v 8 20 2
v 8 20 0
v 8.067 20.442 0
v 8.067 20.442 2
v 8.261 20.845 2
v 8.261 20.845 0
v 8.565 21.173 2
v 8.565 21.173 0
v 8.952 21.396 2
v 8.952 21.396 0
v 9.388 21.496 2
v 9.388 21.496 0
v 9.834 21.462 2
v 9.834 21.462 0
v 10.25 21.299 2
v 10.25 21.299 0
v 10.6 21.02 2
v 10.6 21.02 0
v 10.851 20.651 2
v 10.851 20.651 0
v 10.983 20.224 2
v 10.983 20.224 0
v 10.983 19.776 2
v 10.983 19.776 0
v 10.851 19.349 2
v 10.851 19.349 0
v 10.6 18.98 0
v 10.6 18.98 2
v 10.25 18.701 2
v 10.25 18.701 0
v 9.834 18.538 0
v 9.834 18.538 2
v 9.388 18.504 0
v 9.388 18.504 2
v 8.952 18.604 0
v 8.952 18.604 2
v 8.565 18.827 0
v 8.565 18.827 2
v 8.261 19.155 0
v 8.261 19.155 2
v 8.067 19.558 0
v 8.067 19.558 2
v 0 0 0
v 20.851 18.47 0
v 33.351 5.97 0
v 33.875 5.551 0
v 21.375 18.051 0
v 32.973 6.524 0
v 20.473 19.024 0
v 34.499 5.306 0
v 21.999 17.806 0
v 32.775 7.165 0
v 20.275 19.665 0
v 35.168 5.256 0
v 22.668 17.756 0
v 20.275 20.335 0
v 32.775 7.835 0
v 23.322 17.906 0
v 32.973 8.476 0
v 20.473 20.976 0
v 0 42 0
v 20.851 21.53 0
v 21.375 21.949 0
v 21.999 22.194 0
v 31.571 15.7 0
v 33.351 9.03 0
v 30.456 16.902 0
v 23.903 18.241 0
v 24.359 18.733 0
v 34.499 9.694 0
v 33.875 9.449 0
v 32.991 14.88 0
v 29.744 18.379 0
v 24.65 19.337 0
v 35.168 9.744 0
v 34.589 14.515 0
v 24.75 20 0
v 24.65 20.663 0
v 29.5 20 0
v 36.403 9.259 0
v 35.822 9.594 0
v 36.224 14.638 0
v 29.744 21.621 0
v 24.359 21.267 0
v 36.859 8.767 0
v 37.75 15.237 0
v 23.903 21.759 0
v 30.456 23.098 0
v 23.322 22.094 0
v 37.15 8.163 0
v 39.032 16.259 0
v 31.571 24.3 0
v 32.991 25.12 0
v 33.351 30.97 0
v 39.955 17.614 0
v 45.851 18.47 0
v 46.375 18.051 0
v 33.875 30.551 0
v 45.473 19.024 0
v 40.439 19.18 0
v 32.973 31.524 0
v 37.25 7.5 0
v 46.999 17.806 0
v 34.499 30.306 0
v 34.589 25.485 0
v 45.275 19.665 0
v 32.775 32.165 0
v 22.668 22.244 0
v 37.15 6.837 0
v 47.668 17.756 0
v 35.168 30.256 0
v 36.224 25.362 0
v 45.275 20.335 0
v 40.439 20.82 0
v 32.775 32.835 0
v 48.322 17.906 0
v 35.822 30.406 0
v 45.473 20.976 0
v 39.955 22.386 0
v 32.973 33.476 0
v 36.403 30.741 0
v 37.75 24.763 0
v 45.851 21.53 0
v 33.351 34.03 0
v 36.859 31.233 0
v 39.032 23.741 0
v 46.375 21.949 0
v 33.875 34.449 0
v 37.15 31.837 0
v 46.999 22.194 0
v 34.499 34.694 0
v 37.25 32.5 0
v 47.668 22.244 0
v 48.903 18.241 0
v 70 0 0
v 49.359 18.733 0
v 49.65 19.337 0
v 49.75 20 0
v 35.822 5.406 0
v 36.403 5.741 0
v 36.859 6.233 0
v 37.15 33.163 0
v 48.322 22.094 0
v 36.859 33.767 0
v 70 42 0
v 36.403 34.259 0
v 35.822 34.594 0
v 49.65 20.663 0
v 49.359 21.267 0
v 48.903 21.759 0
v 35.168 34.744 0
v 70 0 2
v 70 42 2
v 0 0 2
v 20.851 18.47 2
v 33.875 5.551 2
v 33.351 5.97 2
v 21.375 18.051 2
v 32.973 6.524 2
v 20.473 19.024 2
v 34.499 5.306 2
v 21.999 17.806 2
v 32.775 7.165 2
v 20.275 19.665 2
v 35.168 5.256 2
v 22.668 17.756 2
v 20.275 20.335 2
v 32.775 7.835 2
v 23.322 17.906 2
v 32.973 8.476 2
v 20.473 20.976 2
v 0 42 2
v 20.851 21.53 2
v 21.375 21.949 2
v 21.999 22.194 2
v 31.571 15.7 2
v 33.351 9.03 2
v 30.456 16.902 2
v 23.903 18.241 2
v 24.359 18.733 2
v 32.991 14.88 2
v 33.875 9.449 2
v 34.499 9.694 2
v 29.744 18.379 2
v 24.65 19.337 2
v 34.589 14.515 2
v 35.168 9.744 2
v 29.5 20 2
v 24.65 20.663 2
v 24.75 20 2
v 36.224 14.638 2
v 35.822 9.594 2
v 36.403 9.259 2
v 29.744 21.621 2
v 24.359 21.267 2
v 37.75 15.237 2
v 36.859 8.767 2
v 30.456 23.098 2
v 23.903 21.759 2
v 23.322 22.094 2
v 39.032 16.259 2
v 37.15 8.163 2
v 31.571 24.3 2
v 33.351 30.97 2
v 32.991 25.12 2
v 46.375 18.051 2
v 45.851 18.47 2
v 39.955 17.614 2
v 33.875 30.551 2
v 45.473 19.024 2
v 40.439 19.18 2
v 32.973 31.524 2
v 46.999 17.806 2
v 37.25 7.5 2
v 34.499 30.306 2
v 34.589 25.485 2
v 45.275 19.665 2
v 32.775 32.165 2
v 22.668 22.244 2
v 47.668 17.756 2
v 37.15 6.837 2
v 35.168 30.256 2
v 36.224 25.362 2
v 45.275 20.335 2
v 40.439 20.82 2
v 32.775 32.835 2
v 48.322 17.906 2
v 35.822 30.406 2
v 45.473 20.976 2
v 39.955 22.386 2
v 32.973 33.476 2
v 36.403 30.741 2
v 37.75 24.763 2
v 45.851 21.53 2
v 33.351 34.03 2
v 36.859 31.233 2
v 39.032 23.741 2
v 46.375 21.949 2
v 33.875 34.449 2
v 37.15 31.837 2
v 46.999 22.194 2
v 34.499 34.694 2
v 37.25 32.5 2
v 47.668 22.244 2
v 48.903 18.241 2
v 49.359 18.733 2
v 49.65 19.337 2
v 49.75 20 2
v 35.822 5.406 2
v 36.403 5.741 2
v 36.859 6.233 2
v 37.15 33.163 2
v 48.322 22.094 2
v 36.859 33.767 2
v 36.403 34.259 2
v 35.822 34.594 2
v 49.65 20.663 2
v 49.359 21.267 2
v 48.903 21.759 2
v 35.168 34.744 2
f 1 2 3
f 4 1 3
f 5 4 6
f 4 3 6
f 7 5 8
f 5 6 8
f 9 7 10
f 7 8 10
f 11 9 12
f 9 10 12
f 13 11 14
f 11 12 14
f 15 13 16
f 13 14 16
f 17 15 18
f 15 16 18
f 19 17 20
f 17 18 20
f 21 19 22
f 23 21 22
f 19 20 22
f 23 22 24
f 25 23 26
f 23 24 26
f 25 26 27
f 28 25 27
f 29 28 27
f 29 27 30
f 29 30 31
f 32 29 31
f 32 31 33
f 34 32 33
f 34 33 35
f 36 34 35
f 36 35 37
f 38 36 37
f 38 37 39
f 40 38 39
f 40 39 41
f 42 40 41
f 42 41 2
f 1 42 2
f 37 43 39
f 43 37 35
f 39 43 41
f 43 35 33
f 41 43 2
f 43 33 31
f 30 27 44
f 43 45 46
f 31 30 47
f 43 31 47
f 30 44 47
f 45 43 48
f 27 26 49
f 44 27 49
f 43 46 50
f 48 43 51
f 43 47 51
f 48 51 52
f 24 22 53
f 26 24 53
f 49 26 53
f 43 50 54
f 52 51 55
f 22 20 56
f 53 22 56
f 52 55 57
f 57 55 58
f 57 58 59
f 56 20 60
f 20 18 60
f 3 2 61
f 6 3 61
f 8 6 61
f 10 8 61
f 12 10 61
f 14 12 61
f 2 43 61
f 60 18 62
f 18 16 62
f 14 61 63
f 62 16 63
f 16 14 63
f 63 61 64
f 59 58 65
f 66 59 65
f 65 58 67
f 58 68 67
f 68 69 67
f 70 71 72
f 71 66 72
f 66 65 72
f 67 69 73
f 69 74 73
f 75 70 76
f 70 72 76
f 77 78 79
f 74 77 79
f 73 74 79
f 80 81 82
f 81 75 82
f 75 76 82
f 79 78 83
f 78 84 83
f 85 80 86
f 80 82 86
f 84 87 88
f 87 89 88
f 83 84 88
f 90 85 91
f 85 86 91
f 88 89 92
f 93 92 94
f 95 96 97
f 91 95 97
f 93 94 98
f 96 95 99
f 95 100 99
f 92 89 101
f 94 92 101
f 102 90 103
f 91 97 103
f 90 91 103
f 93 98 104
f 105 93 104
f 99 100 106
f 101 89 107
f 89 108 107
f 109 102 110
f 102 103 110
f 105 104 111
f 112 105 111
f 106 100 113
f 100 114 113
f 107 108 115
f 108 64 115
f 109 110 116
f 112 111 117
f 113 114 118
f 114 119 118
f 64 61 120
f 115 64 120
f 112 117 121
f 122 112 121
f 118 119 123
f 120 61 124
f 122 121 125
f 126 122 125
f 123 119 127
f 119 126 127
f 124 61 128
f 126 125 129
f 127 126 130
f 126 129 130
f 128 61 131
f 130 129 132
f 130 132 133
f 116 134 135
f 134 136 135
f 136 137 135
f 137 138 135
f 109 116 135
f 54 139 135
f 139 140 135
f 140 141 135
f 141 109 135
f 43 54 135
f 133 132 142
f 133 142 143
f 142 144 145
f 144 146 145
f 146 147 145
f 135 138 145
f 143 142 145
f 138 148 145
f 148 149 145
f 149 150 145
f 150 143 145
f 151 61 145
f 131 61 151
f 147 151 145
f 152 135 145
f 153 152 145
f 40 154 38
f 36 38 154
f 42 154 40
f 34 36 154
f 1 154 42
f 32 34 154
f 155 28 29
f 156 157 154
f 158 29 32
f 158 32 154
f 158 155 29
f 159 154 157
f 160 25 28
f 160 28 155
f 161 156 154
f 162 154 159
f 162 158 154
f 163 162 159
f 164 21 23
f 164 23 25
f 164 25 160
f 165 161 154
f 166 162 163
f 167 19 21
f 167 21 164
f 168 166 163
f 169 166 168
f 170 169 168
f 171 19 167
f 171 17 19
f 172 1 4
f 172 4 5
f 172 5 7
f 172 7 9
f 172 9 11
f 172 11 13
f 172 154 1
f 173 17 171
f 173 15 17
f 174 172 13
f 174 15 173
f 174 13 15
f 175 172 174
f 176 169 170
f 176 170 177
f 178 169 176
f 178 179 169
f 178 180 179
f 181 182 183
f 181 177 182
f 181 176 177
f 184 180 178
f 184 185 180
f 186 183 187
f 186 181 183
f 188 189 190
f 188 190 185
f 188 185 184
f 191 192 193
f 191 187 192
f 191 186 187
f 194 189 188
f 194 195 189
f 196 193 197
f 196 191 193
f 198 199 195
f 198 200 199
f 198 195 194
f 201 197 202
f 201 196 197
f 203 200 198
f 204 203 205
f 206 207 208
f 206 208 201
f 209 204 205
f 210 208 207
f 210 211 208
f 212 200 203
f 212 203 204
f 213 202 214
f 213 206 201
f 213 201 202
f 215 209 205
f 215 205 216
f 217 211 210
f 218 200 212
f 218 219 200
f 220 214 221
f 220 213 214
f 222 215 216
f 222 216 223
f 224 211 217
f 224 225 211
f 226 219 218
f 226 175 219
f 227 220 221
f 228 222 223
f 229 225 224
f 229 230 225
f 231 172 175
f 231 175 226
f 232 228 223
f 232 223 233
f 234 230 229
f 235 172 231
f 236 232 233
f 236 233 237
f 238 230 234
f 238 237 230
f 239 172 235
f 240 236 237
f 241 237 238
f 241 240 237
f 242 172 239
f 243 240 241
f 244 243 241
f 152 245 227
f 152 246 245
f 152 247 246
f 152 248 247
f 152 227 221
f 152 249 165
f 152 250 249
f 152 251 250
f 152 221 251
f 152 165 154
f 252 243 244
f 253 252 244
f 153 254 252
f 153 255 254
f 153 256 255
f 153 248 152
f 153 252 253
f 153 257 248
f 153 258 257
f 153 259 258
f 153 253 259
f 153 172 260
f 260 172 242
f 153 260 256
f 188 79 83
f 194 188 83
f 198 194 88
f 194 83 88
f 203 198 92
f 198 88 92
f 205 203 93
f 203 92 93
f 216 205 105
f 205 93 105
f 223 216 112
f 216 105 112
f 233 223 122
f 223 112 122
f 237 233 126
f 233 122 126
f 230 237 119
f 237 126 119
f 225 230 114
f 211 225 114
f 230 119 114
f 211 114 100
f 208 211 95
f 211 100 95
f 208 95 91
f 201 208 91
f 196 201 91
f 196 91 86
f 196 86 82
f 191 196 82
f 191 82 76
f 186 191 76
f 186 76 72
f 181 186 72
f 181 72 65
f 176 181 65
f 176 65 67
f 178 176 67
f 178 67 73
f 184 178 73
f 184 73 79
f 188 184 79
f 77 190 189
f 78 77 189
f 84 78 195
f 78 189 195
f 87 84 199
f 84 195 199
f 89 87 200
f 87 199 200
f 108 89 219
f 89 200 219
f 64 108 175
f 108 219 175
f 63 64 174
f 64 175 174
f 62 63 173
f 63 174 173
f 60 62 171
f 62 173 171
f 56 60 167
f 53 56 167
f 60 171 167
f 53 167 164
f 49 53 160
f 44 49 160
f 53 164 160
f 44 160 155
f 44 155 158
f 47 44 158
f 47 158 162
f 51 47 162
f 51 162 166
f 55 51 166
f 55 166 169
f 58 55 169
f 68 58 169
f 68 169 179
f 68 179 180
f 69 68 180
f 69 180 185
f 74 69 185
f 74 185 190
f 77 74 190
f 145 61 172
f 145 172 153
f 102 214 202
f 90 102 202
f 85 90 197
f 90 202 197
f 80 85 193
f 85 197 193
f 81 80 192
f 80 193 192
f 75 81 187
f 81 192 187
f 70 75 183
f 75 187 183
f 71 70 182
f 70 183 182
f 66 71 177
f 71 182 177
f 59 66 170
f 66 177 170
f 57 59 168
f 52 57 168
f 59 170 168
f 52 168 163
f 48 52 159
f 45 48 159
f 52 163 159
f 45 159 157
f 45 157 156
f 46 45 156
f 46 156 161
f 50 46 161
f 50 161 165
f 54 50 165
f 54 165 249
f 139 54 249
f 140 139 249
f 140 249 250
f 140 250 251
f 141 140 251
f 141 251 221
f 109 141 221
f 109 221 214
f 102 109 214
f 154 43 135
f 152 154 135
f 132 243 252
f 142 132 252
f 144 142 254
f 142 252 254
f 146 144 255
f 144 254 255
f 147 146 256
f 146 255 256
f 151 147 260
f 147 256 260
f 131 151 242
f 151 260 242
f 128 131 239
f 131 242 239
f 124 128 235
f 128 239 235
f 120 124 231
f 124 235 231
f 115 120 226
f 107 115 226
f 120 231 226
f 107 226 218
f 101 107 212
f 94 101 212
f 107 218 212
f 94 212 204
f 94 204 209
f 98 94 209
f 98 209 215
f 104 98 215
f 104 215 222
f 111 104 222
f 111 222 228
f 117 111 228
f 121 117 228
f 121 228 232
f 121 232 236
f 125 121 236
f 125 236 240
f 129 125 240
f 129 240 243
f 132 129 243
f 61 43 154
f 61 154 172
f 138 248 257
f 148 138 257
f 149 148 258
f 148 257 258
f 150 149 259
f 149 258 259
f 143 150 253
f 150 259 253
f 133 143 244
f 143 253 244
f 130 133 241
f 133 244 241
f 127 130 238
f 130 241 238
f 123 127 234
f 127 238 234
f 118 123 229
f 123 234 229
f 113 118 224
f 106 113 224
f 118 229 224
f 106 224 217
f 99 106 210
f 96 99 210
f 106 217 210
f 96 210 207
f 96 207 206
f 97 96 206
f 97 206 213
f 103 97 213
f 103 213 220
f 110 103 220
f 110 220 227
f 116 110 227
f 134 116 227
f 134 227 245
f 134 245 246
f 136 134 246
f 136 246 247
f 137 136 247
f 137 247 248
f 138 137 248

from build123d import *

# Parameters (mm, degrees)
ESQUISSE1_W             = 70
ESQUISSE1_H             = 42
BOSS_EXTRU_1_DEPTH      = 2
D_GAGEMENT_M41_D        = 4.5
ESQUISSE4_R             = 5.5
ENL_V_MAT_EXTRU_1_DEPTH = 3
ESQUISSE2_R             = 1.5
ENL_V_MAT_EXTRU_2_DEPTH = 3


with BuildPart() as part:
    # Esquisse1 → Boss.-Extru.1 (new body)
    with BuildSketch(Plane.XY):
        with Locations((35, 21)):
            Rectangle(ESQUISSE1_W, ESQUISSE1_H)
    extrude(amount=BOSS_EXTRU_1_DEPTH)

    # Dégagement M41 (through all)
    with Locations(Plane(origin=(35, 32.5, 0), x_dir=(-1, 0, 0), z_dir=(0, 0, -1))):
        with Locations((0, 0), (-12.5, -12.5), (0, -25), (12.5, -12.5)):
            Hole(D_GAGEMENT_M41_D / 2)

    # Esquisse4 → Enlèv. mat.-Extru.1 (cut, through all)
    with BuildSketch(Plane(origin=(0, 0, 0), x_dir=(-1, 0, 0), z_dir=(0, 0, -1))):
        with Locations((-35, 20)):
            Circle(ESQUISSE4_R)
    extrude(amount=-ENL_V_MAT_EXTRU_1_DEPTH, mode=Mode.SUBTRACT)

    # Esquisse2 → Enlèv. mat.-Extru.2 (cut, through all)
    with BuildSketch(Plane(origin=(0, 0, 0), x_dir=(-1, 0, 0), z_dir=(0, 0, -1))):
        with Locations((-9.5, 20)):
            Circle(ESQUISSE2_R)
    extrude(amount=-ENL_V_MAT_EXTRU_2_DEPTH, mode=Mode.SUBTRACT)


solid = part.part
